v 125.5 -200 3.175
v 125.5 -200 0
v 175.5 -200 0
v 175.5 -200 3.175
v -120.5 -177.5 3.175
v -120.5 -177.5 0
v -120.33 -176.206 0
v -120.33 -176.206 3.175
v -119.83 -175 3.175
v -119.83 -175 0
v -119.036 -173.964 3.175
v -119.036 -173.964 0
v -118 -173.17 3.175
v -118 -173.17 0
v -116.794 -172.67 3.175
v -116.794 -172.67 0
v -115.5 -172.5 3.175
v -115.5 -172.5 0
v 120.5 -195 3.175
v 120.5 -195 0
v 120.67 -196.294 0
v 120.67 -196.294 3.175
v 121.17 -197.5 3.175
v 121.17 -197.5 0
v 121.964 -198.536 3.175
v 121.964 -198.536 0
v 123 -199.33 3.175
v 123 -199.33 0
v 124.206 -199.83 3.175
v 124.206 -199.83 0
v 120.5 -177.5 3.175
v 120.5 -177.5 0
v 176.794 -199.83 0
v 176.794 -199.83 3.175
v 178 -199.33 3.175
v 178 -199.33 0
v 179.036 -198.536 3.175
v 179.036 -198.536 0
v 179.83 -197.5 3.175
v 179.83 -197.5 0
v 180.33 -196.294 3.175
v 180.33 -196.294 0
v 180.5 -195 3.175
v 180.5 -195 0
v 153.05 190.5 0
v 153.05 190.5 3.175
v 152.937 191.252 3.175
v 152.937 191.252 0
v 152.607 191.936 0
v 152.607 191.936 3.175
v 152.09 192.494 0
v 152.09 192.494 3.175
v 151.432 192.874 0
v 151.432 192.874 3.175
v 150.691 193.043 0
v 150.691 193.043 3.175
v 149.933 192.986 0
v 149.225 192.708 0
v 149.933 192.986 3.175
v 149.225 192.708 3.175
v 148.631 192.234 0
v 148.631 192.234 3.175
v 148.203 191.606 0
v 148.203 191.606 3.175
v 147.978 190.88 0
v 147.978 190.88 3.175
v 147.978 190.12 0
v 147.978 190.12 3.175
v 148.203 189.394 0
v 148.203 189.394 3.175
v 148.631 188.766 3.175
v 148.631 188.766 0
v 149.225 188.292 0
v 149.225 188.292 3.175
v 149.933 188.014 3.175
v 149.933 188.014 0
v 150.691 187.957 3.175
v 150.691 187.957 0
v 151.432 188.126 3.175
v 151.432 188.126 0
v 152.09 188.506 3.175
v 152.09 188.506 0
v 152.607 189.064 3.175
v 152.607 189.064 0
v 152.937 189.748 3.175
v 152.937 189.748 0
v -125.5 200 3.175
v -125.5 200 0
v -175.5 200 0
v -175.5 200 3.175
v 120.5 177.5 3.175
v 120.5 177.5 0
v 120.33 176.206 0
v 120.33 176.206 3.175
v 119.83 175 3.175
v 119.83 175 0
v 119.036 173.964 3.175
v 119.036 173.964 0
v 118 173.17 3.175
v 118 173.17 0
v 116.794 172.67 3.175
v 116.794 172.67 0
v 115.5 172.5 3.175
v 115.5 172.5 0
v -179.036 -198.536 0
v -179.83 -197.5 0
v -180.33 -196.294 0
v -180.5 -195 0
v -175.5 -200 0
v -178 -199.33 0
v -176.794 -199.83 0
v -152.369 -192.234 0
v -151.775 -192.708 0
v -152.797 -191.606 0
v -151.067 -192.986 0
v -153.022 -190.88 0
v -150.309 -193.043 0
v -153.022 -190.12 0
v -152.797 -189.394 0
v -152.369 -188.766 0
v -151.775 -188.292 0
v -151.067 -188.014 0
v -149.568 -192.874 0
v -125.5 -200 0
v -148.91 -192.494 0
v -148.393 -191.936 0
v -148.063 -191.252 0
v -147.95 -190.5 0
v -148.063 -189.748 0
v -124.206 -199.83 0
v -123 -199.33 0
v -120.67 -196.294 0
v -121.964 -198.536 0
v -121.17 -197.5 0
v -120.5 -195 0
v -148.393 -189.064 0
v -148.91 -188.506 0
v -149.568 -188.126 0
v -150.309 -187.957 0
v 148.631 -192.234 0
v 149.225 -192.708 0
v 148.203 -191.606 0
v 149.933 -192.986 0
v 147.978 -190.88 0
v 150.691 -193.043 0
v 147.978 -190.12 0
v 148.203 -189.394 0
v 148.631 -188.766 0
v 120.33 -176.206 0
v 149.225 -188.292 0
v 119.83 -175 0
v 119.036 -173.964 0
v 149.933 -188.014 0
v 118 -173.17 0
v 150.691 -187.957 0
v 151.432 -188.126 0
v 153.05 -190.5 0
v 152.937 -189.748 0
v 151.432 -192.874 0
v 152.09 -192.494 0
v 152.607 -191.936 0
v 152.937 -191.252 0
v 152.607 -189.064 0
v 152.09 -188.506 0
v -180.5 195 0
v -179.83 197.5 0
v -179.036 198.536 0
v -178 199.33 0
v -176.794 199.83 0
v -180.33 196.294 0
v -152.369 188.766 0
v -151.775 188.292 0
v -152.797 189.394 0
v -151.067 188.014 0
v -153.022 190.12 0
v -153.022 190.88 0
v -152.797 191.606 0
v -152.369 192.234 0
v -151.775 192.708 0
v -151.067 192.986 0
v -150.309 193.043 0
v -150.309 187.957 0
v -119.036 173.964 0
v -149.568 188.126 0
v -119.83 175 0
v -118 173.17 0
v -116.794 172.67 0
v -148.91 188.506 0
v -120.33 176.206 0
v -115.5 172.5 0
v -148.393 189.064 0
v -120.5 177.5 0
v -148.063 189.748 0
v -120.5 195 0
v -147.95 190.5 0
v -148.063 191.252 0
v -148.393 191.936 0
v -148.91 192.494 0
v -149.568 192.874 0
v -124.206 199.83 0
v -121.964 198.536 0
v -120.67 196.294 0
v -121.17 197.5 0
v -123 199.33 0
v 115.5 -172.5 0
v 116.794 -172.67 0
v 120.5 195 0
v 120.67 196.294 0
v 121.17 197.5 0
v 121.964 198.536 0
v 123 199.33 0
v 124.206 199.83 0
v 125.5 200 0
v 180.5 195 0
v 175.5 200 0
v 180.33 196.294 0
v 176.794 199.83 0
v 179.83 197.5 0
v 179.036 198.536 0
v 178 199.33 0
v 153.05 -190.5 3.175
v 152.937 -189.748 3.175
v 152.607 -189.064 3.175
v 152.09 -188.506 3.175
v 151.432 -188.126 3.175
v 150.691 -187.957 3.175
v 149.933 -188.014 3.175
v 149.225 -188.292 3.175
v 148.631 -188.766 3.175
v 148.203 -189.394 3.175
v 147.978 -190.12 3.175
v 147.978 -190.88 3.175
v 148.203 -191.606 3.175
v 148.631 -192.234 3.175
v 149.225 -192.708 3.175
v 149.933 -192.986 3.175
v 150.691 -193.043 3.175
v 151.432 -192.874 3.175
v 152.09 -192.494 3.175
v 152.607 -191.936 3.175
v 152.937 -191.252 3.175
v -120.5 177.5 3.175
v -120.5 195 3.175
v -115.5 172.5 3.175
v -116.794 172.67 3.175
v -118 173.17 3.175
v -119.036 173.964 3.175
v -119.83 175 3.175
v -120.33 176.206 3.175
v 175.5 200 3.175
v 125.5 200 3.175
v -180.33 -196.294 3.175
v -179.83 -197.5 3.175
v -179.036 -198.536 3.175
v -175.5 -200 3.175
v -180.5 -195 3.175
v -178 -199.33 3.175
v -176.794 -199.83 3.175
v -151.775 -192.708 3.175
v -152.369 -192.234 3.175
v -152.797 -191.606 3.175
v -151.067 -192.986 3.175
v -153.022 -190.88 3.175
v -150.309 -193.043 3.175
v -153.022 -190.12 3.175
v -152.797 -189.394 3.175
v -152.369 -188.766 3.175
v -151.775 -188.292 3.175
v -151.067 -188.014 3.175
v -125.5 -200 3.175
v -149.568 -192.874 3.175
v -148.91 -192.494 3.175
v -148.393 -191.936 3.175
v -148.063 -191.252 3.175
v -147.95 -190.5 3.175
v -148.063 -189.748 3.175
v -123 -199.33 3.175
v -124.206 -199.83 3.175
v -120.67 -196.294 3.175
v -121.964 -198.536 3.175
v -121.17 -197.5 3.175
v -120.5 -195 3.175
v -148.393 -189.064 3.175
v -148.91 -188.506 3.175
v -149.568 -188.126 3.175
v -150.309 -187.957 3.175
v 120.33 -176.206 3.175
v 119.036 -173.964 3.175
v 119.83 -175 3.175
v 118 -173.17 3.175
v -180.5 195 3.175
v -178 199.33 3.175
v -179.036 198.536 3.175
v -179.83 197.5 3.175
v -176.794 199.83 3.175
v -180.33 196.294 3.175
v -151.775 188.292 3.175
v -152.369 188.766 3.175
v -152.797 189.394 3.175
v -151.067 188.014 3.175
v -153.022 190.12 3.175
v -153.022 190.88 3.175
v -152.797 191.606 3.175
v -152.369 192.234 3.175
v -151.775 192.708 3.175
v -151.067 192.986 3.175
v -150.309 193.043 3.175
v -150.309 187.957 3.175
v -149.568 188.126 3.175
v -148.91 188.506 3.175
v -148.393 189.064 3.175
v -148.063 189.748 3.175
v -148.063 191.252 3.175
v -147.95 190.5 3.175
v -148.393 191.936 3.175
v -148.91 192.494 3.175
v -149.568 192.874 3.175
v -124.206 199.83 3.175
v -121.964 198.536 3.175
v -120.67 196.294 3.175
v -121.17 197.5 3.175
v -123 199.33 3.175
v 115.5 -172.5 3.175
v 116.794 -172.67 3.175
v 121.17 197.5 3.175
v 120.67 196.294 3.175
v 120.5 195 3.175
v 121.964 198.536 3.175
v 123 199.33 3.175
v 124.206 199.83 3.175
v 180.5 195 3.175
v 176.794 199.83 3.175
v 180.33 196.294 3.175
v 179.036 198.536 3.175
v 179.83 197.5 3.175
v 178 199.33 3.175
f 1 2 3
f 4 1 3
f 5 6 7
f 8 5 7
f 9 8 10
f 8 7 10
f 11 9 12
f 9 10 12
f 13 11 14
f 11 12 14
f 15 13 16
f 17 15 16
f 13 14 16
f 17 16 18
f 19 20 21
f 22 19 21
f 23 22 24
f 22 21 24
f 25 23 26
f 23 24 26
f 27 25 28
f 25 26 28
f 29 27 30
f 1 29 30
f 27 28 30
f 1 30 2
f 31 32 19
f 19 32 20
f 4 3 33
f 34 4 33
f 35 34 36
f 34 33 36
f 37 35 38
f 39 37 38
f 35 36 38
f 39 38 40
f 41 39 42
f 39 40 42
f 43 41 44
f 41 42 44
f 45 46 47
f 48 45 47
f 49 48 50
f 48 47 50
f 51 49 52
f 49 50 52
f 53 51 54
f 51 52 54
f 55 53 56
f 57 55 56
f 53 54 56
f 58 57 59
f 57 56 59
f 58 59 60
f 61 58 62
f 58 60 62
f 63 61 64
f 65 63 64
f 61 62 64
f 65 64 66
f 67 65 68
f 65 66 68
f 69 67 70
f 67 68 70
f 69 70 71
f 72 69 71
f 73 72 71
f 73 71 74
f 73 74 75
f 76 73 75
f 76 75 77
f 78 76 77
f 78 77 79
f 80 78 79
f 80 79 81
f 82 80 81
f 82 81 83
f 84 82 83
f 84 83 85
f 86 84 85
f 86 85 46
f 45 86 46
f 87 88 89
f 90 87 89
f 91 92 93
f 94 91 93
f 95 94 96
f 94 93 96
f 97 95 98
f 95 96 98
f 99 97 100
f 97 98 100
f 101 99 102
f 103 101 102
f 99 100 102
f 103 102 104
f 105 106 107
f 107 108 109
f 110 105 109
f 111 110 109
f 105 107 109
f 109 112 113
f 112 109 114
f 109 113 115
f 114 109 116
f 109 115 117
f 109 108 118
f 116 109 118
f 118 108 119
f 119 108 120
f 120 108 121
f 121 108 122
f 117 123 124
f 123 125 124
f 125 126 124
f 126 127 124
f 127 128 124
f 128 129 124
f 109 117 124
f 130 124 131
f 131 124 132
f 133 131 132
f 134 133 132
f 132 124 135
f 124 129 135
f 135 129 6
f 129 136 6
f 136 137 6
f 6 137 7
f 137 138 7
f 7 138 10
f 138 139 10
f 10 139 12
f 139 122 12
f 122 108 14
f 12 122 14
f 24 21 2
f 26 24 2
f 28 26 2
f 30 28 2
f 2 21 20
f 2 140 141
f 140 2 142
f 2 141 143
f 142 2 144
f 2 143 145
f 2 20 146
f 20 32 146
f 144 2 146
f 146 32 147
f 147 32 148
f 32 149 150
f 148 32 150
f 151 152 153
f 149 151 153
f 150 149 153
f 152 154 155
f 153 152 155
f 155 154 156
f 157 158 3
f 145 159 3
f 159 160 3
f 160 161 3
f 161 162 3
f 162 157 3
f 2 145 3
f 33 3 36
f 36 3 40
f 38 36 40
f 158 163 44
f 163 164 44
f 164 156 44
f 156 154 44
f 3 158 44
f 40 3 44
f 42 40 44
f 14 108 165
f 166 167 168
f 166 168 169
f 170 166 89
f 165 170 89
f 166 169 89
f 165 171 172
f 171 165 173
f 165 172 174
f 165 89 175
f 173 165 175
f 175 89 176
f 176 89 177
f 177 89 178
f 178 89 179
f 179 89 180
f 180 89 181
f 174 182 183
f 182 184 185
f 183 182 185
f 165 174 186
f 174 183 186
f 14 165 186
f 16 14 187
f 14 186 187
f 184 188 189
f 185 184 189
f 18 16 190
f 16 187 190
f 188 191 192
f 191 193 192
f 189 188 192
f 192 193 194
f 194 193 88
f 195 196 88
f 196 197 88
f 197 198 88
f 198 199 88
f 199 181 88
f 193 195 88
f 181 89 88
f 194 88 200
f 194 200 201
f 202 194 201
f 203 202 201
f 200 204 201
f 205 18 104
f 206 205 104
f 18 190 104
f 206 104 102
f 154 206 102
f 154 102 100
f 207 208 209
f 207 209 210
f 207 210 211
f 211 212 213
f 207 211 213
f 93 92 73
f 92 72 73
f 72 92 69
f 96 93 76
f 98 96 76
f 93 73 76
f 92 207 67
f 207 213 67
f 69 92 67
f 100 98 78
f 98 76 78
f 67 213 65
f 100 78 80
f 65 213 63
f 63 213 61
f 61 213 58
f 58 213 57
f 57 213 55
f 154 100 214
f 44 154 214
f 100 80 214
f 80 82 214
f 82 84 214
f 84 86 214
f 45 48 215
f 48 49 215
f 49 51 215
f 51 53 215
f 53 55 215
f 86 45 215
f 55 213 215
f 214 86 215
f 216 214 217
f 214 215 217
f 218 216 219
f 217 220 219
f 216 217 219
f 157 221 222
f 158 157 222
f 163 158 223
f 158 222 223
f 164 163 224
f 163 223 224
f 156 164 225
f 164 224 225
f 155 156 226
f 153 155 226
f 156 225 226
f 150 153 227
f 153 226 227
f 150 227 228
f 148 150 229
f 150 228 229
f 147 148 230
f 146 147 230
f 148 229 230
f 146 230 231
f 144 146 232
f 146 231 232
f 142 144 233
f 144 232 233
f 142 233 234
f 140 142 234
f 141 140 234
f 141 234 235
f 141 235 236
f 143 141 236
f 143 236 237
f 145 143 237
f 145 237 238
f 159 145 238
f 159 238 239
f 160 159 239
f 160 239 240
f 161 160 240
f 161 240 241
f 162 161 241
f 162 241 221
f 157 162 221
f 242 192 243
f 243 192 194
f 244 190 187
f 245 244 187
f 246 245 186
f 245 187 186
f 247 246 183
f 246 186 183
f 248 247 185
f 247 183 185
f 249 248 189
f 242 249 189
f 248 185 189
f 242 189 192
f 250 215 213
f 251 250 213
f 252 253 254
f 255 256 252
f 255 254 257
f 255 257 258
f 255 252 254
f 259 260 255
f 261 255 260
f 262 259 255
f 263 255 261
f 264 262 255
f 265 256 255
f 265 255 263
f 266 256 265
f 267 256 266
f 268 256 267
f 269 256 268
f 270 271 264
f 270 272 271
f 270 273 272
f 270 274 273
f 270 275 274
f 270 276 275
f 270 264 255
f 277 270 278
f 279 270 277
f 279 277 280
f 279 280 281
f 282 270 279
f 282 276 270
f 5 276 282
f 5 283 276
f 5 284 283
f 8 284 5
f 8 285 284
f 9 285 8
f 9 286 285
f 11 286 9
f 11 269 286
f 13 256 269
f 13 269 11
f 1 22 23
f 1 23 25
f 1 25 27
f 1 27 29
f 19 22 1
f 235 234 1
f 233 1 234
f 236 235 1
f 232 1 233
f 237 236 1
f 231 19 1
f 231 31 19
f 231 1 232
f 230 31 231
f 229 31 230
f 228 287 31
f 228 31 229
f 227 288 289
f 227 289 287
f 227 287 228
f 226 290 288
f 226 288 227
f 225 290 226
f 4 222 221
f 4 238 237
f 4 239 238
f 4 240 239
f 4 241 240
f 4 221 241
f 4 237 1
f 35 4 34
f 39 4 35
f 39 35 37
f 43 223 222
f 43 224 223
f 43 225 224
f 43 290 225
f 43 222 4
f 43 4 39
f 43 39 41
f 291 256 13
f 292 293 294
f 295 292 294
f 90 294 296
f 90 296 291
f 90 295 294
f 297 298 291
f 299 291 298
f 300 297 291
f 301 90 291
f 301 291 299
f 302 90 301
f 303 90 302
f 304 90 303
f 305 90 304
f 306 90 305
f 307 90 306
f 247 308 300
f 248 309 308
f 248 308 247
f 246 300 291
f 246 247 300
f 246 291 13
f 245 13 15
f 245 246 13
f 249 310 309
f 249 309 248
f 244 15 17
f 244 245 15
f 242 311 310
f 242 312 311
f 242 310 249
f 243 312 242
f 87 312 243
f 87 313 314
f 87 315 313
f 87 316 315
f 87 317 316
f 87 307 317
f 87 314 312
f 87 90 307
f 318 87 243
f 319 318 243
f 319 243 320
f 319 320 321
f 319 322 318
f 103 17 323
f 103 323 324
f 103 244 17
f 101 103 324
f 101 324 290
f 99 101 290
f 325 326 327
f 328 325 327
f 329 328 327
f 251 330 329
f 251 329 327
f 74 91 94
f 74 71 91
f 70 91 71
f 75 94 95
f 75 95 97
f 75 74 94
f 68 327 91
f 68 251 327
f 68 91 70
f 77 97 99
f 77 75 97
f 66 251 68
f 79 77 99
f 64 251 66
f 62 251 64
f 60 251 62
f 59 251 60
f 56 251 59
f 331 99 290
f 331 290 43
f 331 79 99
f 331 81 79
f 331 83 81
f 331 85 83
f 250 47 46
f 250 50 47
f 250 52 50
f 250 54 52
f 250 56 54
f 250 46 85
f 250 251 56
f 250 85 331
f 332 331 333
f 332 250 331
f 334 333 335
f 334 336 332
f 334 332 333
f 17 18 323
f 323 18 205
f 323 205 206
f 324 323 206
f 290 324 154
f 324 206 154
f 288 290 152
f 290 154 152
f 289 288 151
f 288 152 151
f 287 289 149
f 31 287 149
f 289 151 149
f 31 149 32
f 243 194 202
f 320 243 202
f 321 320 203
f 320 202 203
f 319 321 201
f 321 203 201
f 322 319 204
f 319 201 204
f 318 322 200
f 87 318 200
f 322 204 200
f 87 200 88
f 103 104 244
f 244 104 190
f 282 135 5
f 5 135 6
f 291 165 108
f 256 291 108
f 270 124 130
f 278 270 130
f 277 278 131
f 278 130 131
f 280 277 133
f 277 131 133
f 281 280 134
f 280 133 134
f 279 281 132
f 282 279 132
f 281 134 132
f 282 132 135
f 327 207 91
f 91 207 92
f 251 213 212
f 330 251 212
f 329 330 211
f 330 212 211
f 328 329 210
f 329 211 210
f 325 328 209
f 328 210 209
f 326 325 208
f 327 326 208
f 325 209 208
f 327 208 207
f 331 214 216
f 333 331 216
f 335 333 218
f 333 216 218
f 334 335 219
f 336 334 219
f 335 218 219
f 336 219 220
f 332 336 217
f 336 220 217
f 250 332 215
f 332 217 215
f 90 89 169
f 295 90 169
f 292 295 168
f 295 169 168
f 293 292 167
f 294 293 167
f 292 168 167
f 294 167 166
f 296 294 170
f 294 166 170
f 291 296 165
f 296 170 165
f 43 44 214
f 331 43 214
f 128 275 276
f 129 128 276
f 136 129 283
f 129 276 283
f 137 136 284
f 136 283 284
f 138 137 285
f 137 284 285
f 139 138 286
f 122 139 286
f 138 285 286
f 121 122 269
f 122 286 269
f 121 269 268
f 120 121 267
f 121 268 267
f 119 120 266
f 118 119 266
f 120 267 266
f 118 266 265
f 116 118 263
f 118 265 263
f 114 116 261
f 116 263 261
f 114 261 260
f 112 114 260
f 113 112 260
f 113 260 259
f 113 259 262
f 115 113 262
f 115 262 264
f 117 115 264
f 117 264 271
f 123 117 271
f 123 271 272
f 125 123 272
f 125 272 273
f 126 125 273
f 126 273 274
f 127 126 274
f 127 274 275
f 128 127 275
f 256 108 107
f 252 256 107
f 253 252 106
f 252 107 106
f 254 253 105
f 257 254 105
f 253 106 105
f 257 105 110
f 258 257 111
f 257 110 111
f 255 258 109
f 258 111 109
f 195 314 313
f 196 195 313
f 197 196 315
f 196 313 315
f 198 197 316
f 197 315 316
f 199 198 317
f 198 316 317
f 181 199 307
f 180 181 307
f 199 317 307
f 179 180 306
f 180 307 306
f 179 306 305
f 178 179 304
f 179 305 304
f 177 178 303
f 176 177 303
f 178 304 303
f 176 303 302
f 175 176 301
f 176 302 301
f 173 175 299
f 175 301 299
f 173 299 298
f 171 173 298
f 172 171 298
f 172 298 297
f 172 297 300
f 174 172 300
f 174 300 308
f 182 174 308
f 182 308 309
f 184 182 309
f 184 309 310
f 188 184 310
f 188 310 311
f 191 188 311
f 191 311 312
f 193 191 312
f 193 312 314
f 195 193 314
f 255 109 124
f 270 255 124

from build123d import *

# Parameters (mm, degrees)
BOSS_EXTRUDE1_DEPTH = 3.175
CUT_EXTRUDE1_REACH  = 271.426
SKETCH2_R           = 2.55


with BuildPart() as part:
    # Model → Boss-Extrude1 (new body)
    with BuildSketch(Plane.XY):
        with BuildLine():
            ThreePointArc((180.500000042, 195), (179.035533948, 198.535533906), (175.500000042, 200))
            Line((175.500000042, 200), (125.500000042, 200))
            ThreePointArc((125.500000042, 200), (121.964466136, 198.535533906), (120.500000042, 195))
            Line((120.500000042, 195), (120.500000042, 177.5))
            ThreePointArc((120.500000042, 177.5), (119.035533948, 173.964466094), (115.500000042, 172.5))
            Line((115.500000042, 172.5), (-115.500000042, 172.5))
            ThreePointArc((-115.500000042, 172.5), (-119.035533948, 173.964466094), (-120.500000042, 177.5))
            Line((-120.500000042, 177.5), (-120.500000042, 195))
            ThreePointArc((-120.500000042, 195), (-121.964466136, 198.535533906), (-125.500000042, 200))
            Line((-125.500000042, 200), (-175.500000042, 200))
            ThreePointArc((-175.500000042, 200), (-179.035533948, 198.535533906), (-180.500000042, 195))
            Line((-180.500000042, 195), (-180.500000042, -195))
            ThreePointArc((-180.500000042, -195), (-179.035533948, -198.535533906), (-175.500000042, -200))
            Line((-175.500000042, -200), (-125.500000042, -200))
            ThreePointArc((-125.500000042, -200), (-121.964466136, -198.535533906), (-120.500000042, -195))
            Line((-120.500000042, -195), (-120.500000042, -177.5))
            ThreePointArc((-120.500000042, -177.5), (-119.035533948, -173.964466094), (-115.500000042, -172.5))
            Line((-115.500000042, -172.5), (115.500000042, -172.5))
            ThreePointArc((115.500000042, -172.5), (119.035533948, -173.964466094), (120.500000042, -177.5))
            Line((120.500000042, -177.5), (120.500000042, -195))
            ThreePointArc((120.500000042, -195), (121.964466136, -198.535533906), (125.500000042, -200))
            Line((125.500000042, -200), (175.500000042, -200))
            ThreePointArc((175.500000042, -200), (179.035533948, -198.535533906), (180.500000042, -195))
            Line((180.500000042, -195), (180.500000042, 195))
        make_face()
    extrude(amount=BOSS_EXTRUDE1_DEPTH)

    # Sketch2 → Cut-Extrude1 (cut, up to next)
    with BuildSketch(Plane.XY.offset(3.175), mode=Mode.PRIVATE) as cut_extrude1_sk1:
        with Locations((-150.5, 190.5)):
            Circle(SKETCH2_R)
    cut_extrude1_tool1 = extrude(cut_extrude1_sk1.sketch, amount=-CUT_EXTRUDE1_REACH, mode=Mode.PRIVATE) & part.part
    # Sketch2 → Cut-Extrude1 (cut, up to next)
    with BuildSketch(Plane.XY.offset(3.175), mode=Mode.PRIVATE) as cut_extrude1_sk2:
        with Locations((150.5, 190.5)):
            Circle(SKETCH2_R)
    cut_extrude1_tool2 = extrude(cut_extrude1_sk2.sketch, amount=-CUT_EXTRUDE1_REACH, mode=Mode.PRIVATE) & part.part
    # Sketch2 → Cut-Extrude1 (cut, up to next)
    with BuildSketch(Plane.XY.offset(3.175), mode=Mode.PRIVATE) as cut_extrude1_sk3:
        with Locations((150.5, -190.5)):
            Circle(SKETCH2_R)
    cut_extrude1_tool3 = extrude(cut_extrude1_sk3.sketch, amount=-CUT_EXTRUDE1_REACH, mode=Mode.PRIVATE) & part.part
    # Sketch2 → Cut-Extrude1 (cut, up to next)
    with BuildSketch(Plane.XY.offset(3.175), mode=Mode.PRIVATE) as cut_extrude1_sk4:
        with Locations((-150.5, -190.5)):
            Circle(SKETCH2_R)
    cut_extrude1_tool4 = extrude(cut_extrude1_sk4.sketch, amount=-CUT_EXTRUDE1_REACH, mode=Mode.PRIVATE) & part.part
    add(cut_extrude1_tool1.solids().sort_by_distance((-150.5, 190.5, 3.175))[0], mode=Mode.SUBTRACT)
    add(cut_extrude1_tool2.solids().sort_by_distance((150.5, 190.5, 3.175))[0], mode=Mode.SUBTRACT)
    add(cut_extrude1_tool3.solids().sort_by_distance((150.5, -190.5, 3.175))[0], mode=Mode.SUBTRACT)
    add(cut_extrude1_tool4.solids().sort_by_distance((-150.5, -190.5, 3.175))[0], mode=Mode.SUBTRACT)


solid = part.part
